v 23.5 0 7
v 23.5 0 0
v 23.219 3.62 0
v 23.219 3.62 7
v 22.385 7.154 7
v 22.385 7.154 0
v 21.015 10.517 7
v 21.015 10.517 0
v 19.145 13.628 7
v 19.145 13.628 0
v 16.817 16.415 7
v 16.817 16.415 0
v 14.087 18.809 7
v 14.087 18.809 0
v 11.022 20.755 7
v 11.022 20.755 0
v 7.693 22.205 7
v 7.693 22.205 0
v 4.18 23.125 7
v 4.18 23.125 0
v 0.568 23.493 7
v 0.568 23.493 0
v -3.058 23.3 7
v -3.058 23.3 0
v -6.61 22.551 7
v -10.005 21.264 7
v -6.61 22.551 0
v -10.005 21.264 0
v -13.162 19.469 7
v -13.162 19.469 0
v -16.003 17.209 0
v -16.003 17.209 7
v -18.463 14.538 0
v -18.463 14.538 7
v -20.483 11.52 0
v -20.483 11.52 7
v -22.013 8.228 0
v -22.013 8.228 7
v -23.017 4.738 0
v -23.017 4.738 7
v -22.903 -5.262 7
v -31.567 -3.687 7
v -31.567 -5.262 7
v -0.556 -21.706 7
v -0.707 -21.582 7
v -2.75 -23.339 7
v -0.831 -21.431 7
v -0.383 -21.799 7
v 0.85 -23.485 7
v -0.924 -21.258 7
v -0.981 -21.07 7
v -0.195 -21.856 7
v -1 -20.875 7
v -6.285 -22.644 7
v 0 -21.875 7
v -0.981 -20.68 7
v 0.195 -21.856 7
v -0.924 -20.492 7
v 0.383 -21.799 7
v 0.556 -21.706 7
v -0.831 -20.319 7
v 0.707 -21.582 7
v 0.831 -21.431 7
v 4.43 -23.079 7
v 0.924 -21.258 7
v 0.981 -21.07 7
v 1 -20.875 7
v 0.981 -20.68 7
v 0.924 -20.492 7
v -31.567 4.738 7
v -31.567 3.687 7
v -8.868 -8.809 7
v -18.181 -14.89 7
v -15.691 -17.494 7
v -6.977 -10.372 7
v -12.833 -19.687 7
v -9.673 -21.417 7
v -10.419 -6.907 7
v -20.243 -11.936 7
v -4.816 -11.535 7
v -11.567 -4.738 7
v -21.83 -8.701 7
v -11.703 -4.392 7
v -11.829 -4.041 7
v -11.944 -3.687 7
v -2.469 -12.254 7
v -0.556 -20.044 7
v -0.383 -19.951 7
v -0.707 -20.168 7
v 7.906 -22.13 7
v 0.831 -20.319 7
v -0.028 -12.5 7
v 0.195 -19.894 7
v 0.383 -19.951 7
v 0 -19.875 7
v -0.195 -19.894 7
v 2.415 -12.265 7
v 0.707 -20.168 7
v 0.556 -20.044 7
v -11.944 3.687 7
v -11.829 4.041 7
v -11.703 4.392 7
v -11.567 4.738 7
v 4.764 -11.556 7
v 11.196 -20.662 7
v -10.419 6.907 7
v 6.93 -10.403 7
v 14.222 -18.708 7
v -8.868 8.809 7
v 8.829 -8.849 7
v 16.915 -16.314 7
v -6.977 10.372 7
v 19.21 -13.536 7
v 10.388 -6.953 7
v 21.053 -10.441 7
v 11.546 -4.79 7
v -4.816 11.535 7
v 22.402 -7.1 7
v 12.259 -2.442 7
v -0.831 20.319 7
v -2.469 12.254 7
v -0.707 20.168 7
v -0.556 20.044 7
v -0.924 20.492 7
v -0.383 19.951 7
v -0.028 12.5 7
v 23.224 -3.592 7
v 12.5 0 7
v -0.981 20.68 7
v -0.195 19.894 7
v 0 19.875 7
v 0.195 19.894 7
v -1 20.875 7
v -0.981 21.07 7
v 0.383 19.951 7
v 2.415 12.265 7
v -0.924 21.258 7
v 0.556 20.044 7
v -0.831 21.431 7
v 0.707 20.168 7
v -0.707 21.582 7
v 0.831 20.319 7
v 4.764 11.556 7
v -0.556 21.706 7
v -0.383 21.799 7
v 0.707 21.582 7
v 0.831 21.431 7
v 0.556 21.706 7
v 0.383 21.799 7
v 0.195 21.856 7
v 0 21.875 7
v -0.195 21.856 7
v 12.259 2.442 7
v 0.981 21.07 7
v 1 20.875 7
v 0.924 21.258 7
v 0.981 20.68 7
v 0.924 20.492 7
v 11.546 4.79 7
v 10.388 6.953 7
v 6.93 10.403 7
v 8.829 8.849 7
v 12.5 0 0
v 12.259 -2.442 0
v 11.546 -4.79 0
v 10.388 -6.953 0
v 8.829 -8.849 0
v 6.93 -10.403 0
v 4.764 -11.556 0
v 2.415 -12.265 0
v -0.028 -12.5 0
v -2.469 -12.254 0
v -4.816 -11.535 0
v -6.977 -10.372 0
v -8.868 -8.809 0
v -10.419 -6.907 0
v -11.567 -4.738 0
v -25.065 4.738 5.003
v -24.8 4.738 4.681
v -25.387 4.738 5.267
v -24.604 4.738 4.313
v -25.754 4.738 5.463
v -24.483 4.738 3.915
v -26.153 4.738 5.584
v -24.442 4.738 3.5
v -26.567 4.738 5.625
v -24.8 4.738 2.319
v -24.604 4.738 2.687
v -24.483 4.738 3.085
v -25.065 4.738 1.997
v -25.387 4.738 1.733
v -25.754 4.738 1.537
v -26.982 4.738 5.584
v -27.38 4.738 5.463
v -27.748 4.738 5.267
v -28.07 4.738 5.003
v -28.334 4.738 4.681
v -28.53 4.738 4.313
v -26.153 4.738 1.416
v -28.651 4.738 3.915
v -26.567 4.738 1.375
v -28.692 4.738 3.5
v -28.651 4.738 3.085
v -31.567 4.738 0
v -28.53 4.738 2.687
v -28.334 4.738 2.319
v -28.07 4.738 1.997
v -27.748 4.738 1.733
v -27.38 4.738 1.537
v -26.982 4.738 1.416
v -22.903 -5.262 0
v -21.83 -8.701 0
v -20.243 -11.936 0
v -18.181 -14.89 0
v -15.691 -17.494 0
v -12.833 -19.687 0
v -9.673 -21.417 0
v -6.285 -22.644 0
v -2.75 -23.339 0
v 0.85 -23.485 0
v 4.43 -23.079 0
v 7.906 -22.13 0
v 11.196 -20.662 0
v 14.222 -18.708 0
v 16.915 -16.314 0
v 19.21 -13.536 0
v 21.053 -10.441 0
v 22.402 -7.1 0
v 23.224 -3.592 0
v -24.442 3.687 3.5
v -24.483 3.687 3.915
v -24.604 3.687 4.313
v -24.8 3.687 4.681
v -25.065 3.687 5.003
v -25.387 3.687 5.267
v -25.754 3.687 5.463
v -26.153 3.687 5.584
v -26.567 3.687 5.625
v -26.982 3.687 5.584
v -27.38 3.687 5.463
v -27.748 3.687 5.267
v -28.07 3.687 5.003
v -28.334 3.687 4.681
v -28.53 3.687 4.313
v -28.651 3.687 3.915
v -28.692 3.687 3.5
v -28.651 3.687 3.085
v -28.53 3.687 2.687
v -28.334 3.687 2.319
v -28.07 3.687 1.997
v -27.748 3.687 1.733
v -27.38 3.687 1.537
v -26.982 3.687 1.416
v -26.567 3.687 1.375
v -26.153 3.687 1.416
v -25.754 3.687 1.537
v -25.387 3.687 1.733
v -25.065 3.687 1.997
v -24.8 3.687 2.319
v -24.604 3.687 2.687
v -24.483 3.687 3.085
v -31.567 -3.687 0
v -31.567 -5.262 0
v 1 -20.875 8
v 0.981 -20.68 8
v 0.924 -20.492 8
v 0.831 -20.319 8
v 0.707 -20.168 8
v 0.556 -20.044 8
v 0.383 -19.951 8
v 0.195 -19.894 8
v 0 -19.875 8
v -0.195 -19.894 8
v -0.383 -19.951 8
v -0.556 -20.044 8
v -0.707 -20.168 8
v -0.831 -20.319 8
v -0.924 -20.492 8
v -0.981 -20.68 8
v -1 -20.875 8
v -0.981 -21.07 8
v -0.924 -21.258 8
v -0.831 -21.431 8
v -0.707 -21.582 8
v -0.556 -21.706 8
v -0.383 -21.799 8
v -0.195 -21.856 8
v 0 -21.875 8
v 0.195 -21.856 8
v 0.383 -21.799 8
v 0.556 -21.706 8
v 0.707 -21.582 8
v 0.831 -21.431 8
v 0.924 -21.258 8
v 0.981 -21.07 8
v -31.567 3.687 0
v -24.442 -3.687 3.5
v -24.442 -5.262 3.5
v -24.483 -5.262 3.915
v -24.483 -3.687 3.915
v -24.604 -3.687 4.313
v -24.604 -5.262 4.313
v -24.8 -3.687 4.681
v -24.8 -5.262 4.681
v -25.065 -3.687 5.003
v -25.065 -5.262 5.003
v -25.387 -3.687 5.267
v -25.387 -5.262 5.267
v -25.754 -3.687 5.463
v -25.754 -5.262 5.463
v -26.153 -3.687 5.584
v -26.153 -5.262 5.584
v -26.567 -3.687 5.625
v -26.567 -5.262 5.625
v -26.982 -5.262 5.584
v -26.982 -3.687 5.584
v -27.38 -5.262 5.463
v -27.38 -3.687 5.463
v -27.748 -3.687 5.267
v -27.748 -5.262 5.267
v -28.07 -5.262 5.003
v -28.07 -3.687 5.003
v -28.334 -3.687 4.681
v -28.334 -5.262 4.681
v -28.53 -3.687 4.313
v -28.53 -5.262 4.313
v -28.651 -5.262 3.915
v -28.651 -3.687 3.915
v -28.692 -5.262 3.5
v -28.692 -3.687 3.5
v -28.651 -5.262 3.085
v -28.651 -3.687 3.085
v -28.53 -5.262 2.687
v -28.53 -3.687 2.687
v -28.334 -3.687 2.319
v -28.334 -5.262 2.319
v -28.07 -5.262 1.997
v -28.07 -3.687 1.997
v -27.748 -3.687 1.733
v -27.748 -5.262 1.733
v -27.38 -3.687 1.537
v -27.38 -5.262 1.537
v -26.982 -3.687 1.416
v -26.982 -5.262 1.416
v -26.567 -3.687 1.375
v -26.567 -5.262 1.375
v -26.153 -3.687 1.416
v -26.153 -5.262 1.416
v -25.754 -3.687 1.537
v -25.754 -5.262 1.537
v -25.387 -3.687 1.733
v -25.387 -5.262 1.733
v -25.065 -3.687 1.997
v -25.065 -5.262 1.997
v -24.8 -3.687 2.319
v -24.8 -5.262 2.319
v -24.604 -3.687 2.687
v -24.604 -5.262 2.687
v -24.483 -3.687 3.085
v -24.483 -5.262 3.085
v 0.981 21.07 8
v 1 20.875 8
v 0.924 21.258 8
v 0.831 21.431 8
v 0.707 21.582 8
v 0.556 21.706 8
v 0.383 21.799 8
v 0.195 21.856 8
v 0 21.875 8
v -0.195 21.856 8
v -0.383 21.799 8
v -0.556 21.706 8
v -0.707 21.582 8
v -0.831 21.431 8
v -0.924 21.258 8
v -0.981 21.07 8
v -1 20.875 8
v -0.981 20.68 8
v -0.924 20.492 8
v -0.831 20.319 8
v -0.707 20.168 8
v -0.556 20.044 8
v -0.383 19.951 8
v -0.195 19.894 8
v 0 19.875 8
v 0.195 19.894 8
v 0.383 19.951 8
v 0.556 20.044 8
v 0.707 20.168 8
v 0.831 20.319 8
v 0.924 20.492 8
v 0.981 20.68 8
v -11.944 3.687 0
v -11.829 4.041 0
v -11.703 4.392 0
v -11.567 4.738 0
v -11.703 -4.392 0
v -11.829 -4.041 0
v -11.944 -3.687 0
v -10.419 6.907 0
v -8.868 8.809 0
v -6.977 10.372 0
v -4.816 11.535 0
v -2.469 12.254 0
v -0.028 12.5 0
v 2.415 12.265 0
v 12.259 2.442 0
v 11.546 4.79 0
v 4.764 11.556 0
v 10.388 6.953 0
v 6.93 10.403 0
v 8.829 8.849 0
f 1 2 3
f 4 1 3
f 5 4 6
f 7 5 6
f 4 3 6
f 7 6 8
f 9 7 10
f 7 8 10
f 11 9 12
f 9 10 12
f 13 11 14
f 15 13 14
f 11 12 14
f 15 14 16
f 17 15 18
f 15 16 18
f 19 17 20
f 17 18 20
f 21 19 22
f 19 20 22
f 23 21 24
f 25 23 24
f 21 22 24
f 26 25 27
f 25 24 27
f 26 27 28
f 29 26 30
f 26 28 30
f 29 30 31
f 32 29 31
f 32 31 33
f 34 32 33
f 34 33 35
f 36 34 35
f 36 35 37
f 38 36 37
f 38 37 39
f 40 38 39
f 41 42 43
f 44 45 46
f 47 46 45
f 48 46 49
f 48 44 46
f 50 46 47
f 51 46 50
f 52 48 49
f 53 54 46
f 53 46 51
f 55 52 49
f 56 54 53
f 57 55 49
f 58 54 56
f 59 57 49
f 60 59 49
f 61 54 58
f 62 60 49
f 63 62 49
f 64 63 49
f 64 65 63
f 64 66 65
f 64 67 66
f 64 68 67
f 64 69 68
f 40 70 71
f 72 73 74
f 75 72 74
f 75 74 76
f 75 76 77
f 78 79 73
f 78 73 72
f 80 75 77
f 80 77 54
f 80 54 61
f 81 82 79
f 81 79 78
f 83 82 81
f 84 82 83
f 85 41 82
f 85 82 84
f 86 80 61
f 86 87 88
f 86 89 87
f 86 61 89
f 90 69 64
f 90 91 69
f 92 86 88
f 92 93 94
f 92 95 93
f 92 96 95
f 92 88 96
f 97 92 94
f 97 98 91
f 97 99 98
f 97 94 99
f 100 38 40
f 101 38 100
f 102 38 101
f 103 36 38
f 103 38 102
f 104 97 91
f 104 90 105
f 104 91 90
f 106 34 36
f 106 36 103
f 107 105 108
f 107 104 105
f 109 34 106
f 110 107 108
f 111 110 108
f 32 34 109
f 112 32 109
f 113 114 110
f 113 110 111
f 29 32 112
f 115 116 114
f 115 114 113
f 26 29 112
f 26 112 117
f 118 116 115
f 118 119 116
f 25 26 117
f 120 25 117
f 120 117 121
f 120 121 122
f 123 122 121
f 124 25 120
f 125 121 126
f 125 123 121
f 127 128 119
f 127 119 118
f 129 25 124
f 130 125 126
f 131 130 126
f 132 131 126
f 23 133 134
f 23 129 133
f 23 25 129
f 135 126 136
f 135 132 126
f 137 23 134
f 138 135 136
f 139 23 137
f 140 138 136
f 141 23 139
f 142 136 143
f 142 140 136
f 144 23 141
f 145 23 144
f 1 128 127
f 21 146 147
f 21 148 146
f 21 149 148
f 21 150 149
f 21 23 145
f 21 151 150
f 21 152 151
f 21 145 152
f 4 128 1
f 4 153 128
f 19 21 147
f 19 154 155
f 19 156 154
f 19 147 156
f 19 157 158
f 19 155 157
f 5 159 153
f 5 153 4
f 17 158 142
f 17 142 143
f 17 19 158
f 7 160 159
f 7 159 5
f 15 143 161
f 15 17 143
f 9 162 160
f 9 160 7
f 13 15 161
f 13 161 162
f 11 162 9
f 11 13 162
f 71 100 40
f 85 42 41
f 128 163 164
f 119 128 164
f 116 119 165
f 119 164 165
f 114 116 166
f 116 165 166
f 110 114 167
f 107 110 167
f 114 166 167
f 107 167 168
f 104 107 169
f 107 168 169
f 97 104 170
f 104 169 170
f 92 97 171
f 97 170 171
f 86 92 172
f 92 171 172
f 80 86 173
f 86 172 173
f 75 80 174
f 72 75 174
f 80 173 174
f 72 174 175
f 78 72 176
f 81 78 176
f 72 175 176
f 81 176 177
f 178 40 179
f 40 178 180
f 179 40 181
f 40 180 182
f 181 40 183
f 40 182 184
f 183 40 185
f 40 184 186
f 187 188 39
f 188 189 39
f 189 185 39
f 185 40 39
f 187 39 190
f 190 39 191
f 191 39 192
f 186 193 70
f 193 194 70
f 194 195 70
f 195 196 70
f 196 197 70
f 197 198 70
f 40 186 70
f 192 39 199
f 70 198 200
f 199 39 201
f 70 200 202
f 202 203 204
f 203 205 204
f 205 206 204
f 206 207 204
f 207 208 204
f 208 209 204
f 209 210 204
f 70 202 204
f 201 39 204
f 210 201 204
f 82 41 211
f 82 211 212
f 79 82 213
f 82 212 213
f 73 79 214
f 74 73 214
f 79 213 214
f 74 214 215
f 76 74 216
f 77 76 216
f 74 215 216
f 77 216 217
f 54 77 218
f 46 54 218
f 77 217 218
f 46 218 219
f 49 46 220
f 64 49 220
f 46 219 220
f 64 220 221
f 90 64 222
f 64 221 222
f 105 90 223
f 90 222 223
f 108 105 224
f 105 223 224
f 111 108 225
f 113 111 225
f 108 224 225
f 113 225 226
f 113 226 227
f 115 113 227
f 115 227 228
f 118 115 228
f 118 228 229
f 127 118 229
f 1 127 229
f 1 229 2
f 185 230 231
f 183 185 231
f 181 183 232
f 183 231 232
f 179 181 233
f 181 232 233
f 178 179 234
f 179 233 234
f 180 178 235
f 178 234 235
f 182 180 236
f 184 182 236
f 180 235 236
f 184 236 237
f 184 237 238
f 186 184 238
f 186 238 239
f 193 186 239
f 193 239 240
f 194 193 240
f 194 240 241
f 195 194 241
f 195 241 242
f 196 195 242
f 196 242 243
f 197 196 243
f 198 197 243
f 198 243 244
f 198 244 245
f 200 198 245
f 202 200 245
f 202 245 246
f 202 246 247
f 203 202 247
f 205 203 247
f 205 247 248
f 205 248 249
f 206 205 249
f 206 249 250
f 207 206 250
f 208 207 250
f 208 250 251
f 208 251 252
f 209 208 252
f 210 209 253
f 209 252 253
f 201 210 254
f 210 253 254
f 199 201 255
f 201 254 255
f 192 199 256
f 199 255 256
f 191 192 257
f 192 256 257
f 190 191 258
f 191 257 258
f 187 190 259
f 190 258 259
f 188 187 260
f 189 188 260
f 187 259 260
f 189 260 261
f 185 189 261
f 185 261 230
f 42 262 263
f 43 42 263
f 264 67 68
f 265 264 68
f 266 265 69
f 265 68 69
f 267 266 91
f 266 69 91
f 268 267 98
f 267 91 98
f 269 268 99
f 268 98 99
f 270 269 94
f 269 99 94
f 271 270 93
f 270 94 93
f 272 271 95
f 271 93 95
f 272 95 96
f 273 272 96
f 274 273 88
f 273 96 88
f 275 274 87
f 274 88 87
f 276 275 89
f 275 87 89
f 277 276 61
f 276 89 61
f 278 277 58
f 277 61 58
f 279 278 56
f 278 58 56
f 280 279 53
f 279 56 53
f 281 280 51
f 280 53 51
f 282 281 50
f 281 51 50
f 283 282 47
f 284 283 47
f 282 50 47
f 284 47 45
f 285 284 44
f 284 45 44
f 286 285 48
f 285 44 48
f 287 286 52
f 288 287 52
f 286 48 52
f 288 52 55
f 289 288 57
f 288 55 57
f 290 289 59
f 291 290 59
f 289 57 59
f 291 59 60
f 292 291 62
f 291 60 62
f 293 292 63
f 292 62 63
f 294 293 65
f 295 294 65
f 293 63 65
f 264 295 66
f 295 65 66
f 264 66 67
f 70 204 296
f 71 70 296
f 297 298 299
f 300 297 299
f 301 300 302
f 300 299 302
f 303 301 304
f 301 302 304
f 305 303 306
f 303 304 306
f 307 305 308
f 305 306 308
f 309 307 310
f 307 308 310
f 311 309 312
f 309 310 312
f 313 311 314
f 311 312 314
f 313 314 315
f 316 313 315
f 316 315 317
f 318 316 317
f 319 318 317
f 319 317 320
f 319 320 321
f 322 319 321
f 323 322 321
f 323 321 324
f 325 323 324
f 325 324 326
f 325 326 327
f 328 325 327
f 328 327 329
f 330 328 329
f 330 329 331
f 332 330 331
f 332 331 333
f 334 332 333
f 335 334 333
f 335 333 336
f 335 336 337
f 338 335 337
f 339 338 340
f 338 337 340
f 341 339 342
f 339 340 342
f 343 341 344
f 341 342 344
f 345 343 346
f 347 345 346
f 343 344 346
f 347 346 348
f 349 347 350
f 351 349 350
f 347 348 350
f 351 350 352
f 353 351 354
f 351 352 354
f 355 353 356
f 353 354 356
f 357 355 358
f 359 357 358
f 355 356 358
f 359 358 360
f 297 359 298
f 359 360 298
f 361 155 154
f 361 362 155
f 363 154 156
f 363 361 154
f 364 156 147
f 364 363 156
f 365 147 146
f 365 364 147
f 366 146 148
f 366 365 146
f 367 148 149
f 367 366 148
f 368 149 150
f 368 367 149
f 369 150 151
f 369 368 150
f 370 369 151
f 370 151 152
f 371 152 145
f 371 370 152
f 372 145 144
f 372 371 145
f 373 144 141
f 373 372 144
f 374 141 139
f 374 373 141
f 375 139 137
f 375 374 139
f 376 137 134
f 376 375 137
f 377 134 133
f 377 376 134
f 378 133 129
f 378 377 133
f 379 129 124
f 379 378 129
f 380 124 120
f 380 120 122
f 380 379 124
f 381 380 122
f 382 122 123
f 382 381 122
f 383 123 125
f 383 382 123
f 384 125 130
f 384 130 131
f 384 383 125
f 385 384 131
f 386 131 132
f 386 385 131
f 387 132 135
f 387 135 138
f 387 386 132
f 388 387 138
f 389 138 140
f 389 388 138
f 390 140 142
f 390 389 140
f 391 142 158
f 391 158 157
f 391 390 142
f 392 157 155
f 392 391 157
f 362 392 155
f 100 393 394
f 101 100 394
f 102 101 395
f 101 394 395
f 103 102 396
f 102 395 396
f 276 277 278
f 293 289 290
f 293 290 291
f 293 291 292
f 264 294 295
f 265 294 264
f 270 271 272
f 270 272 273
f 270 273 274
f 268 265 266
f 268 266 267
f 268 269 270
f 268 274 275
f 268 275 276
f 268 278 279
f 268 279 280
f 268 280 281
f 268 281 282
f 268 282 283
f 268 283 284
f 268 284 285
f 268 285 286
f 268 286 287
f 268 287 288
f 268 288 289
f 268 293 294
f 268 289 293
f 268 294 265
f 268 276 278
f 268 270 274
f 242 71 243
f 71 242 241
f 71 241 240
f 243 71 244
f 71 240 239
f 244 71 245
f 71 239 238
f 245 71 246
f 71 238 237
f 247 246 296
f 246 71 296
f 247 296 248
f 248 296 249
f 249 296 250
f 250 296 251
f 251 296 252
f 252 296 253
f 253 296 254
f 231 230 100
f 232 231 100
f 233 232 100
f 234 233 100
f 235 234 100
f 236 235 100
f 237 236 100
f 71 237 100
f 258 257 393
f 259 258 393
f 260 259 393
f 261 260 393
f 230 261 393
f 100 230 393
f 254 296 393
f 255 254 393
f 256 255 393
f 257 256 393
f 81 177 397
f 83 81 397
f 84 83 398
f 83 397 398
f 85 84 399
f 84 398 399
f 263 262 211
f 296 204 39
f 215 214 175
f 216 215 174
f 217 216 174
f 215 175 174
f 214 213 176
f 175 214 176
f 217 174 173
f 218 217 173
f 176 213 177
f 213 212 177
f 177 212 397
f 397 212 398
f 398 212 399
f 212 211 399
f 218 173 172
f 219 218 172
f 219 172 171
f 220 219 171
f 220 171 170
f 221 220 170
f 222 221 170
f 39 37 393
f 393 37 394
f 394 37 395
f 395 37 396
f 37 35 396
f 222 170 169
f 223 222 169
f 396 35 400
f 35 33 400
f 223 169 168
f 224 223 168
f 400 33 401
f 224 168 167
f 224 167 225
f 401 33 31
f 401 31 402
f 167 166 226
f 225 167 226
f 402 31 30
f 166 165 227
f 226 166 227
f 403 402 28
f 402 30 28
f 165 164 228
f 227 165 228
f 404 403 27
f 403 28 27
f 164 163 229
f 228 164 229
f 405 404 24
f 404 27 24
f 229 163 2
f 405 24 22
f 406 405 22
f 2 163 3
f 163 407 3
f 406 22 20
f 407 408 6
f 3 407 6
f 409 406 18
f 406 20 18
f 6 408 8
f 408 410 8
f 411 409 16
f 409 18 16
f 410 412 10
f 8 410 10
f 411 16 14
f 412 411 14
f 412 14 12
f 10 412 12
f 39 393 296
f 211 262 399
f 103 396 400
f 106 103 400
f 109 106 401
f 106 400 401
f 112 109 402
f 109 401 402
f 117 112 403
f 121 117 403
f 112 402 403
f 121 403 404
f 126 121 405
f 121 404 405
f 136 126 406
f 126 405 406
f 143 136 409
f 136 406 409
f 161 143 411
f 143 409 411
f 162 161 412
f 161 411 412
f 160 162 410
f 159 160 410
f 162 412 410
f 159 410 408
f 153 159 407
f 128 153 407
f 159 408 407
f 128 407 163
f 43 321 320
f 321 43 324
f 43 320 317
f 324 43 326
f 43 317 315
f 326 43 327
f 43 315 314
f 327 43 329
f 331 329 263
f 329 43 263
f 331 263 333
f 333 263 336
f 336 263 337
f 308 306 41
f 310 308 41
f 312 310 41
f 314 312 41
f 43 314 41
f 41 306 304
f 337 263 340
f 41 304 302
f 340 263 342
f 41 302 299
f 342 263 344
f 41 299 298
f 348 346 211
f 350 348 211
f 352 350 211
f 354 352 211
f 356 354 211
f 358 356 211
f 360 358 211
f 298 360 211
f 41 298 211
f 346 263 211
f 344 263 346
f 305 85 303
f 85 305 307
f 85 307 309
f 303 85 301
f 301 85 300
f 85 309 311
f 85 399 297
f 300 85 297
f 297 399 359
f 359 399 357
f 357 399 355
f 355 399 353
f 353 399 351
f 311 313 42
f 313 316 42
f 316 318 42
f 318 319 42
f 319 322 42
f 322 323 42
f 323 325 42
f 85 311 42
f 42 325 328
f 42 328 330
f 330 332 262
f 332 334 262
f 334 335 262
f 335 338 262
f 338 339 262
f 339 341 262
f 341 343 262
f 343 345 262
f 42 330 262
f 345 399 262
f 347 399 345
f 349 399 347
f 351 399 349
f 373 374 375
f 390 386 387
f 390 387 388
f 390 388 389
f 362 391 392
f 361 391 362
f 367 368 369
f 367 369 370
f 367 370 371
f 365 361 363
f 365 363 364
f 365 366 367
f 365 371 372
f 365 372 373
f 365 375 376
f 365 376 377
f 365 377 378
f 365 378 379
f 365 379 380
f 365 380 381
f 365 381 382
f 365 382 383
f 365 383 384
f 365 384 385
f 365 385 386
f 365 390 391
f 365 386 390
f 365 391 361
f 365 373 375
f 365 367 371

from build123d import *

# Parameters (mm, degrees)
F1_DEPTH = 7
F2_R     = 2.125
F3_DEPTH = 10
F4_R     = 1
F5_DEPTH = 1


# Not quite as in the source:
# - a feature names something its author has since deleted; it is built from what else it names


with BuildPart() as f1:
    # F0 (on Top) → F1 (new body)
    with BuildSketch(Plane.XY):
        with BuildLine():
            ThreePointArc((-23.208916684, 3.6873006871), (-23.1191027664, 4.2139159074), (-23.017341427, 4.7383534726))
            Line((-23.017341427, 4.7383534726), (-31.5671088163, 4.7383534726))
            Line((-31.5671088163, 4.7383534726), (-31.5671088163, 3.6873006871))
            Line((-31.5671088163, 3.6873006871), (-23.208916684, 3.6873006871))
        make_face()
        with BuildLine():
            Line((-31.5671088163, -5.2616465274), (-22.9033856847, -5.2616465274))
            ThreePointArc((-22.9033856847, -5.2616465274), (-23.0695849256, -4.4770806738), (-23.208916684, -3.6873006871))
            Line((-23.208916684, -3.6873006871), (-31.5671088163, -3.6873006871))
            Line((-31.5671088163, -3.6873006871), (-31.5671088163, -5.2616465274))
        make_face()
        with BuildLine():
            ThreePointArc((-22.9033856847, -5.2616465274), (2.6476816661, -23.3503700569), (23.5, 0))
            ThreePointArc((23.5, 0), (2.3814361701, 23.3790239695), (-23.017341427, 4.7383534726))
            Line((-23.017341427, 4.7383534726), (-11.5671088163, 4.7383534726))
            ThreePointArc((-11.5671088163, 4.7383534726), (2.4146573045, 12.2645599229), (12.5, 0))
            ThreePointArc((12.5, 0), (2.4146573045, -12.2645599229), (-11.5671088163, -4.7383534726))
            Line((-11.5671088163, -4.7383534726), (-11.5671088163, -5.2616465274))
            Line((-11.5671088163, -5.2616465274), (-22.9033856847, -5.2616465274))
        make_face()
        with BuildLine():
            Line((-11.5671088163, 4.7383534726), (-23.017341427, 4.7383534726))
            ThreePointArc((-23.017341427, 4.7383534726), (-23.1191027664, 4.2139159074), (-23.208916684, 3.6873006871))
            Line((-23.208916684, 3.6873006871), (-11.9437771933, 3.6873006871))
            ThreePointArc((-11.9437771933, 3.6873006871), (-11.7671839549, 4.2170347131), (-11.5671088163, 4.7383534726))
        make_face()
        with BuildLine():
            ThreePointArc((-23.208916684, -3.6873006871), (-23.0695849256, -4.4770806738), (-22.9033856847, -5.2616465274))
            Line((-22.9033856847, -5.2616465274), (-11.5671088163, -5.2616465274))
            Line((-11.5671088163, -5.2616465274), (-11.5671088163, -4.7383534726))
            ThreePointArc((-11.5671088163, -4.7383534726), (-11.7671839549, -4.2170347131), (-11.9437771933, -3.6873006871))
            Line((-11.9437771933, -3.6873006871), (-23.208916684, -3.6873006871))
        make_face()
    extrude(amount=F1_DEPTH)

    # F2 (on face) → F3 (cut)
    with BuildSketch(Plane.XZ.offset(5.2616465274)):
        with Locations((-26.5671088163, 3.5)):
            Circle(F2_R)
    extrude(amount=-F3_DEPTH, mode=Mode.SUBTRACT)

    # F4 (on face) → F5 (join, symmetric)
    with BuildSketch(Plane.XY.offset(7)):
        with Locations((0, -20.875)):
            Circle(F4_R)
        with Locations((0, 20.875)):
            Circle(F4_R)
    extrude(amount=F5_DEPTH, both=True)


solid = f1.part
